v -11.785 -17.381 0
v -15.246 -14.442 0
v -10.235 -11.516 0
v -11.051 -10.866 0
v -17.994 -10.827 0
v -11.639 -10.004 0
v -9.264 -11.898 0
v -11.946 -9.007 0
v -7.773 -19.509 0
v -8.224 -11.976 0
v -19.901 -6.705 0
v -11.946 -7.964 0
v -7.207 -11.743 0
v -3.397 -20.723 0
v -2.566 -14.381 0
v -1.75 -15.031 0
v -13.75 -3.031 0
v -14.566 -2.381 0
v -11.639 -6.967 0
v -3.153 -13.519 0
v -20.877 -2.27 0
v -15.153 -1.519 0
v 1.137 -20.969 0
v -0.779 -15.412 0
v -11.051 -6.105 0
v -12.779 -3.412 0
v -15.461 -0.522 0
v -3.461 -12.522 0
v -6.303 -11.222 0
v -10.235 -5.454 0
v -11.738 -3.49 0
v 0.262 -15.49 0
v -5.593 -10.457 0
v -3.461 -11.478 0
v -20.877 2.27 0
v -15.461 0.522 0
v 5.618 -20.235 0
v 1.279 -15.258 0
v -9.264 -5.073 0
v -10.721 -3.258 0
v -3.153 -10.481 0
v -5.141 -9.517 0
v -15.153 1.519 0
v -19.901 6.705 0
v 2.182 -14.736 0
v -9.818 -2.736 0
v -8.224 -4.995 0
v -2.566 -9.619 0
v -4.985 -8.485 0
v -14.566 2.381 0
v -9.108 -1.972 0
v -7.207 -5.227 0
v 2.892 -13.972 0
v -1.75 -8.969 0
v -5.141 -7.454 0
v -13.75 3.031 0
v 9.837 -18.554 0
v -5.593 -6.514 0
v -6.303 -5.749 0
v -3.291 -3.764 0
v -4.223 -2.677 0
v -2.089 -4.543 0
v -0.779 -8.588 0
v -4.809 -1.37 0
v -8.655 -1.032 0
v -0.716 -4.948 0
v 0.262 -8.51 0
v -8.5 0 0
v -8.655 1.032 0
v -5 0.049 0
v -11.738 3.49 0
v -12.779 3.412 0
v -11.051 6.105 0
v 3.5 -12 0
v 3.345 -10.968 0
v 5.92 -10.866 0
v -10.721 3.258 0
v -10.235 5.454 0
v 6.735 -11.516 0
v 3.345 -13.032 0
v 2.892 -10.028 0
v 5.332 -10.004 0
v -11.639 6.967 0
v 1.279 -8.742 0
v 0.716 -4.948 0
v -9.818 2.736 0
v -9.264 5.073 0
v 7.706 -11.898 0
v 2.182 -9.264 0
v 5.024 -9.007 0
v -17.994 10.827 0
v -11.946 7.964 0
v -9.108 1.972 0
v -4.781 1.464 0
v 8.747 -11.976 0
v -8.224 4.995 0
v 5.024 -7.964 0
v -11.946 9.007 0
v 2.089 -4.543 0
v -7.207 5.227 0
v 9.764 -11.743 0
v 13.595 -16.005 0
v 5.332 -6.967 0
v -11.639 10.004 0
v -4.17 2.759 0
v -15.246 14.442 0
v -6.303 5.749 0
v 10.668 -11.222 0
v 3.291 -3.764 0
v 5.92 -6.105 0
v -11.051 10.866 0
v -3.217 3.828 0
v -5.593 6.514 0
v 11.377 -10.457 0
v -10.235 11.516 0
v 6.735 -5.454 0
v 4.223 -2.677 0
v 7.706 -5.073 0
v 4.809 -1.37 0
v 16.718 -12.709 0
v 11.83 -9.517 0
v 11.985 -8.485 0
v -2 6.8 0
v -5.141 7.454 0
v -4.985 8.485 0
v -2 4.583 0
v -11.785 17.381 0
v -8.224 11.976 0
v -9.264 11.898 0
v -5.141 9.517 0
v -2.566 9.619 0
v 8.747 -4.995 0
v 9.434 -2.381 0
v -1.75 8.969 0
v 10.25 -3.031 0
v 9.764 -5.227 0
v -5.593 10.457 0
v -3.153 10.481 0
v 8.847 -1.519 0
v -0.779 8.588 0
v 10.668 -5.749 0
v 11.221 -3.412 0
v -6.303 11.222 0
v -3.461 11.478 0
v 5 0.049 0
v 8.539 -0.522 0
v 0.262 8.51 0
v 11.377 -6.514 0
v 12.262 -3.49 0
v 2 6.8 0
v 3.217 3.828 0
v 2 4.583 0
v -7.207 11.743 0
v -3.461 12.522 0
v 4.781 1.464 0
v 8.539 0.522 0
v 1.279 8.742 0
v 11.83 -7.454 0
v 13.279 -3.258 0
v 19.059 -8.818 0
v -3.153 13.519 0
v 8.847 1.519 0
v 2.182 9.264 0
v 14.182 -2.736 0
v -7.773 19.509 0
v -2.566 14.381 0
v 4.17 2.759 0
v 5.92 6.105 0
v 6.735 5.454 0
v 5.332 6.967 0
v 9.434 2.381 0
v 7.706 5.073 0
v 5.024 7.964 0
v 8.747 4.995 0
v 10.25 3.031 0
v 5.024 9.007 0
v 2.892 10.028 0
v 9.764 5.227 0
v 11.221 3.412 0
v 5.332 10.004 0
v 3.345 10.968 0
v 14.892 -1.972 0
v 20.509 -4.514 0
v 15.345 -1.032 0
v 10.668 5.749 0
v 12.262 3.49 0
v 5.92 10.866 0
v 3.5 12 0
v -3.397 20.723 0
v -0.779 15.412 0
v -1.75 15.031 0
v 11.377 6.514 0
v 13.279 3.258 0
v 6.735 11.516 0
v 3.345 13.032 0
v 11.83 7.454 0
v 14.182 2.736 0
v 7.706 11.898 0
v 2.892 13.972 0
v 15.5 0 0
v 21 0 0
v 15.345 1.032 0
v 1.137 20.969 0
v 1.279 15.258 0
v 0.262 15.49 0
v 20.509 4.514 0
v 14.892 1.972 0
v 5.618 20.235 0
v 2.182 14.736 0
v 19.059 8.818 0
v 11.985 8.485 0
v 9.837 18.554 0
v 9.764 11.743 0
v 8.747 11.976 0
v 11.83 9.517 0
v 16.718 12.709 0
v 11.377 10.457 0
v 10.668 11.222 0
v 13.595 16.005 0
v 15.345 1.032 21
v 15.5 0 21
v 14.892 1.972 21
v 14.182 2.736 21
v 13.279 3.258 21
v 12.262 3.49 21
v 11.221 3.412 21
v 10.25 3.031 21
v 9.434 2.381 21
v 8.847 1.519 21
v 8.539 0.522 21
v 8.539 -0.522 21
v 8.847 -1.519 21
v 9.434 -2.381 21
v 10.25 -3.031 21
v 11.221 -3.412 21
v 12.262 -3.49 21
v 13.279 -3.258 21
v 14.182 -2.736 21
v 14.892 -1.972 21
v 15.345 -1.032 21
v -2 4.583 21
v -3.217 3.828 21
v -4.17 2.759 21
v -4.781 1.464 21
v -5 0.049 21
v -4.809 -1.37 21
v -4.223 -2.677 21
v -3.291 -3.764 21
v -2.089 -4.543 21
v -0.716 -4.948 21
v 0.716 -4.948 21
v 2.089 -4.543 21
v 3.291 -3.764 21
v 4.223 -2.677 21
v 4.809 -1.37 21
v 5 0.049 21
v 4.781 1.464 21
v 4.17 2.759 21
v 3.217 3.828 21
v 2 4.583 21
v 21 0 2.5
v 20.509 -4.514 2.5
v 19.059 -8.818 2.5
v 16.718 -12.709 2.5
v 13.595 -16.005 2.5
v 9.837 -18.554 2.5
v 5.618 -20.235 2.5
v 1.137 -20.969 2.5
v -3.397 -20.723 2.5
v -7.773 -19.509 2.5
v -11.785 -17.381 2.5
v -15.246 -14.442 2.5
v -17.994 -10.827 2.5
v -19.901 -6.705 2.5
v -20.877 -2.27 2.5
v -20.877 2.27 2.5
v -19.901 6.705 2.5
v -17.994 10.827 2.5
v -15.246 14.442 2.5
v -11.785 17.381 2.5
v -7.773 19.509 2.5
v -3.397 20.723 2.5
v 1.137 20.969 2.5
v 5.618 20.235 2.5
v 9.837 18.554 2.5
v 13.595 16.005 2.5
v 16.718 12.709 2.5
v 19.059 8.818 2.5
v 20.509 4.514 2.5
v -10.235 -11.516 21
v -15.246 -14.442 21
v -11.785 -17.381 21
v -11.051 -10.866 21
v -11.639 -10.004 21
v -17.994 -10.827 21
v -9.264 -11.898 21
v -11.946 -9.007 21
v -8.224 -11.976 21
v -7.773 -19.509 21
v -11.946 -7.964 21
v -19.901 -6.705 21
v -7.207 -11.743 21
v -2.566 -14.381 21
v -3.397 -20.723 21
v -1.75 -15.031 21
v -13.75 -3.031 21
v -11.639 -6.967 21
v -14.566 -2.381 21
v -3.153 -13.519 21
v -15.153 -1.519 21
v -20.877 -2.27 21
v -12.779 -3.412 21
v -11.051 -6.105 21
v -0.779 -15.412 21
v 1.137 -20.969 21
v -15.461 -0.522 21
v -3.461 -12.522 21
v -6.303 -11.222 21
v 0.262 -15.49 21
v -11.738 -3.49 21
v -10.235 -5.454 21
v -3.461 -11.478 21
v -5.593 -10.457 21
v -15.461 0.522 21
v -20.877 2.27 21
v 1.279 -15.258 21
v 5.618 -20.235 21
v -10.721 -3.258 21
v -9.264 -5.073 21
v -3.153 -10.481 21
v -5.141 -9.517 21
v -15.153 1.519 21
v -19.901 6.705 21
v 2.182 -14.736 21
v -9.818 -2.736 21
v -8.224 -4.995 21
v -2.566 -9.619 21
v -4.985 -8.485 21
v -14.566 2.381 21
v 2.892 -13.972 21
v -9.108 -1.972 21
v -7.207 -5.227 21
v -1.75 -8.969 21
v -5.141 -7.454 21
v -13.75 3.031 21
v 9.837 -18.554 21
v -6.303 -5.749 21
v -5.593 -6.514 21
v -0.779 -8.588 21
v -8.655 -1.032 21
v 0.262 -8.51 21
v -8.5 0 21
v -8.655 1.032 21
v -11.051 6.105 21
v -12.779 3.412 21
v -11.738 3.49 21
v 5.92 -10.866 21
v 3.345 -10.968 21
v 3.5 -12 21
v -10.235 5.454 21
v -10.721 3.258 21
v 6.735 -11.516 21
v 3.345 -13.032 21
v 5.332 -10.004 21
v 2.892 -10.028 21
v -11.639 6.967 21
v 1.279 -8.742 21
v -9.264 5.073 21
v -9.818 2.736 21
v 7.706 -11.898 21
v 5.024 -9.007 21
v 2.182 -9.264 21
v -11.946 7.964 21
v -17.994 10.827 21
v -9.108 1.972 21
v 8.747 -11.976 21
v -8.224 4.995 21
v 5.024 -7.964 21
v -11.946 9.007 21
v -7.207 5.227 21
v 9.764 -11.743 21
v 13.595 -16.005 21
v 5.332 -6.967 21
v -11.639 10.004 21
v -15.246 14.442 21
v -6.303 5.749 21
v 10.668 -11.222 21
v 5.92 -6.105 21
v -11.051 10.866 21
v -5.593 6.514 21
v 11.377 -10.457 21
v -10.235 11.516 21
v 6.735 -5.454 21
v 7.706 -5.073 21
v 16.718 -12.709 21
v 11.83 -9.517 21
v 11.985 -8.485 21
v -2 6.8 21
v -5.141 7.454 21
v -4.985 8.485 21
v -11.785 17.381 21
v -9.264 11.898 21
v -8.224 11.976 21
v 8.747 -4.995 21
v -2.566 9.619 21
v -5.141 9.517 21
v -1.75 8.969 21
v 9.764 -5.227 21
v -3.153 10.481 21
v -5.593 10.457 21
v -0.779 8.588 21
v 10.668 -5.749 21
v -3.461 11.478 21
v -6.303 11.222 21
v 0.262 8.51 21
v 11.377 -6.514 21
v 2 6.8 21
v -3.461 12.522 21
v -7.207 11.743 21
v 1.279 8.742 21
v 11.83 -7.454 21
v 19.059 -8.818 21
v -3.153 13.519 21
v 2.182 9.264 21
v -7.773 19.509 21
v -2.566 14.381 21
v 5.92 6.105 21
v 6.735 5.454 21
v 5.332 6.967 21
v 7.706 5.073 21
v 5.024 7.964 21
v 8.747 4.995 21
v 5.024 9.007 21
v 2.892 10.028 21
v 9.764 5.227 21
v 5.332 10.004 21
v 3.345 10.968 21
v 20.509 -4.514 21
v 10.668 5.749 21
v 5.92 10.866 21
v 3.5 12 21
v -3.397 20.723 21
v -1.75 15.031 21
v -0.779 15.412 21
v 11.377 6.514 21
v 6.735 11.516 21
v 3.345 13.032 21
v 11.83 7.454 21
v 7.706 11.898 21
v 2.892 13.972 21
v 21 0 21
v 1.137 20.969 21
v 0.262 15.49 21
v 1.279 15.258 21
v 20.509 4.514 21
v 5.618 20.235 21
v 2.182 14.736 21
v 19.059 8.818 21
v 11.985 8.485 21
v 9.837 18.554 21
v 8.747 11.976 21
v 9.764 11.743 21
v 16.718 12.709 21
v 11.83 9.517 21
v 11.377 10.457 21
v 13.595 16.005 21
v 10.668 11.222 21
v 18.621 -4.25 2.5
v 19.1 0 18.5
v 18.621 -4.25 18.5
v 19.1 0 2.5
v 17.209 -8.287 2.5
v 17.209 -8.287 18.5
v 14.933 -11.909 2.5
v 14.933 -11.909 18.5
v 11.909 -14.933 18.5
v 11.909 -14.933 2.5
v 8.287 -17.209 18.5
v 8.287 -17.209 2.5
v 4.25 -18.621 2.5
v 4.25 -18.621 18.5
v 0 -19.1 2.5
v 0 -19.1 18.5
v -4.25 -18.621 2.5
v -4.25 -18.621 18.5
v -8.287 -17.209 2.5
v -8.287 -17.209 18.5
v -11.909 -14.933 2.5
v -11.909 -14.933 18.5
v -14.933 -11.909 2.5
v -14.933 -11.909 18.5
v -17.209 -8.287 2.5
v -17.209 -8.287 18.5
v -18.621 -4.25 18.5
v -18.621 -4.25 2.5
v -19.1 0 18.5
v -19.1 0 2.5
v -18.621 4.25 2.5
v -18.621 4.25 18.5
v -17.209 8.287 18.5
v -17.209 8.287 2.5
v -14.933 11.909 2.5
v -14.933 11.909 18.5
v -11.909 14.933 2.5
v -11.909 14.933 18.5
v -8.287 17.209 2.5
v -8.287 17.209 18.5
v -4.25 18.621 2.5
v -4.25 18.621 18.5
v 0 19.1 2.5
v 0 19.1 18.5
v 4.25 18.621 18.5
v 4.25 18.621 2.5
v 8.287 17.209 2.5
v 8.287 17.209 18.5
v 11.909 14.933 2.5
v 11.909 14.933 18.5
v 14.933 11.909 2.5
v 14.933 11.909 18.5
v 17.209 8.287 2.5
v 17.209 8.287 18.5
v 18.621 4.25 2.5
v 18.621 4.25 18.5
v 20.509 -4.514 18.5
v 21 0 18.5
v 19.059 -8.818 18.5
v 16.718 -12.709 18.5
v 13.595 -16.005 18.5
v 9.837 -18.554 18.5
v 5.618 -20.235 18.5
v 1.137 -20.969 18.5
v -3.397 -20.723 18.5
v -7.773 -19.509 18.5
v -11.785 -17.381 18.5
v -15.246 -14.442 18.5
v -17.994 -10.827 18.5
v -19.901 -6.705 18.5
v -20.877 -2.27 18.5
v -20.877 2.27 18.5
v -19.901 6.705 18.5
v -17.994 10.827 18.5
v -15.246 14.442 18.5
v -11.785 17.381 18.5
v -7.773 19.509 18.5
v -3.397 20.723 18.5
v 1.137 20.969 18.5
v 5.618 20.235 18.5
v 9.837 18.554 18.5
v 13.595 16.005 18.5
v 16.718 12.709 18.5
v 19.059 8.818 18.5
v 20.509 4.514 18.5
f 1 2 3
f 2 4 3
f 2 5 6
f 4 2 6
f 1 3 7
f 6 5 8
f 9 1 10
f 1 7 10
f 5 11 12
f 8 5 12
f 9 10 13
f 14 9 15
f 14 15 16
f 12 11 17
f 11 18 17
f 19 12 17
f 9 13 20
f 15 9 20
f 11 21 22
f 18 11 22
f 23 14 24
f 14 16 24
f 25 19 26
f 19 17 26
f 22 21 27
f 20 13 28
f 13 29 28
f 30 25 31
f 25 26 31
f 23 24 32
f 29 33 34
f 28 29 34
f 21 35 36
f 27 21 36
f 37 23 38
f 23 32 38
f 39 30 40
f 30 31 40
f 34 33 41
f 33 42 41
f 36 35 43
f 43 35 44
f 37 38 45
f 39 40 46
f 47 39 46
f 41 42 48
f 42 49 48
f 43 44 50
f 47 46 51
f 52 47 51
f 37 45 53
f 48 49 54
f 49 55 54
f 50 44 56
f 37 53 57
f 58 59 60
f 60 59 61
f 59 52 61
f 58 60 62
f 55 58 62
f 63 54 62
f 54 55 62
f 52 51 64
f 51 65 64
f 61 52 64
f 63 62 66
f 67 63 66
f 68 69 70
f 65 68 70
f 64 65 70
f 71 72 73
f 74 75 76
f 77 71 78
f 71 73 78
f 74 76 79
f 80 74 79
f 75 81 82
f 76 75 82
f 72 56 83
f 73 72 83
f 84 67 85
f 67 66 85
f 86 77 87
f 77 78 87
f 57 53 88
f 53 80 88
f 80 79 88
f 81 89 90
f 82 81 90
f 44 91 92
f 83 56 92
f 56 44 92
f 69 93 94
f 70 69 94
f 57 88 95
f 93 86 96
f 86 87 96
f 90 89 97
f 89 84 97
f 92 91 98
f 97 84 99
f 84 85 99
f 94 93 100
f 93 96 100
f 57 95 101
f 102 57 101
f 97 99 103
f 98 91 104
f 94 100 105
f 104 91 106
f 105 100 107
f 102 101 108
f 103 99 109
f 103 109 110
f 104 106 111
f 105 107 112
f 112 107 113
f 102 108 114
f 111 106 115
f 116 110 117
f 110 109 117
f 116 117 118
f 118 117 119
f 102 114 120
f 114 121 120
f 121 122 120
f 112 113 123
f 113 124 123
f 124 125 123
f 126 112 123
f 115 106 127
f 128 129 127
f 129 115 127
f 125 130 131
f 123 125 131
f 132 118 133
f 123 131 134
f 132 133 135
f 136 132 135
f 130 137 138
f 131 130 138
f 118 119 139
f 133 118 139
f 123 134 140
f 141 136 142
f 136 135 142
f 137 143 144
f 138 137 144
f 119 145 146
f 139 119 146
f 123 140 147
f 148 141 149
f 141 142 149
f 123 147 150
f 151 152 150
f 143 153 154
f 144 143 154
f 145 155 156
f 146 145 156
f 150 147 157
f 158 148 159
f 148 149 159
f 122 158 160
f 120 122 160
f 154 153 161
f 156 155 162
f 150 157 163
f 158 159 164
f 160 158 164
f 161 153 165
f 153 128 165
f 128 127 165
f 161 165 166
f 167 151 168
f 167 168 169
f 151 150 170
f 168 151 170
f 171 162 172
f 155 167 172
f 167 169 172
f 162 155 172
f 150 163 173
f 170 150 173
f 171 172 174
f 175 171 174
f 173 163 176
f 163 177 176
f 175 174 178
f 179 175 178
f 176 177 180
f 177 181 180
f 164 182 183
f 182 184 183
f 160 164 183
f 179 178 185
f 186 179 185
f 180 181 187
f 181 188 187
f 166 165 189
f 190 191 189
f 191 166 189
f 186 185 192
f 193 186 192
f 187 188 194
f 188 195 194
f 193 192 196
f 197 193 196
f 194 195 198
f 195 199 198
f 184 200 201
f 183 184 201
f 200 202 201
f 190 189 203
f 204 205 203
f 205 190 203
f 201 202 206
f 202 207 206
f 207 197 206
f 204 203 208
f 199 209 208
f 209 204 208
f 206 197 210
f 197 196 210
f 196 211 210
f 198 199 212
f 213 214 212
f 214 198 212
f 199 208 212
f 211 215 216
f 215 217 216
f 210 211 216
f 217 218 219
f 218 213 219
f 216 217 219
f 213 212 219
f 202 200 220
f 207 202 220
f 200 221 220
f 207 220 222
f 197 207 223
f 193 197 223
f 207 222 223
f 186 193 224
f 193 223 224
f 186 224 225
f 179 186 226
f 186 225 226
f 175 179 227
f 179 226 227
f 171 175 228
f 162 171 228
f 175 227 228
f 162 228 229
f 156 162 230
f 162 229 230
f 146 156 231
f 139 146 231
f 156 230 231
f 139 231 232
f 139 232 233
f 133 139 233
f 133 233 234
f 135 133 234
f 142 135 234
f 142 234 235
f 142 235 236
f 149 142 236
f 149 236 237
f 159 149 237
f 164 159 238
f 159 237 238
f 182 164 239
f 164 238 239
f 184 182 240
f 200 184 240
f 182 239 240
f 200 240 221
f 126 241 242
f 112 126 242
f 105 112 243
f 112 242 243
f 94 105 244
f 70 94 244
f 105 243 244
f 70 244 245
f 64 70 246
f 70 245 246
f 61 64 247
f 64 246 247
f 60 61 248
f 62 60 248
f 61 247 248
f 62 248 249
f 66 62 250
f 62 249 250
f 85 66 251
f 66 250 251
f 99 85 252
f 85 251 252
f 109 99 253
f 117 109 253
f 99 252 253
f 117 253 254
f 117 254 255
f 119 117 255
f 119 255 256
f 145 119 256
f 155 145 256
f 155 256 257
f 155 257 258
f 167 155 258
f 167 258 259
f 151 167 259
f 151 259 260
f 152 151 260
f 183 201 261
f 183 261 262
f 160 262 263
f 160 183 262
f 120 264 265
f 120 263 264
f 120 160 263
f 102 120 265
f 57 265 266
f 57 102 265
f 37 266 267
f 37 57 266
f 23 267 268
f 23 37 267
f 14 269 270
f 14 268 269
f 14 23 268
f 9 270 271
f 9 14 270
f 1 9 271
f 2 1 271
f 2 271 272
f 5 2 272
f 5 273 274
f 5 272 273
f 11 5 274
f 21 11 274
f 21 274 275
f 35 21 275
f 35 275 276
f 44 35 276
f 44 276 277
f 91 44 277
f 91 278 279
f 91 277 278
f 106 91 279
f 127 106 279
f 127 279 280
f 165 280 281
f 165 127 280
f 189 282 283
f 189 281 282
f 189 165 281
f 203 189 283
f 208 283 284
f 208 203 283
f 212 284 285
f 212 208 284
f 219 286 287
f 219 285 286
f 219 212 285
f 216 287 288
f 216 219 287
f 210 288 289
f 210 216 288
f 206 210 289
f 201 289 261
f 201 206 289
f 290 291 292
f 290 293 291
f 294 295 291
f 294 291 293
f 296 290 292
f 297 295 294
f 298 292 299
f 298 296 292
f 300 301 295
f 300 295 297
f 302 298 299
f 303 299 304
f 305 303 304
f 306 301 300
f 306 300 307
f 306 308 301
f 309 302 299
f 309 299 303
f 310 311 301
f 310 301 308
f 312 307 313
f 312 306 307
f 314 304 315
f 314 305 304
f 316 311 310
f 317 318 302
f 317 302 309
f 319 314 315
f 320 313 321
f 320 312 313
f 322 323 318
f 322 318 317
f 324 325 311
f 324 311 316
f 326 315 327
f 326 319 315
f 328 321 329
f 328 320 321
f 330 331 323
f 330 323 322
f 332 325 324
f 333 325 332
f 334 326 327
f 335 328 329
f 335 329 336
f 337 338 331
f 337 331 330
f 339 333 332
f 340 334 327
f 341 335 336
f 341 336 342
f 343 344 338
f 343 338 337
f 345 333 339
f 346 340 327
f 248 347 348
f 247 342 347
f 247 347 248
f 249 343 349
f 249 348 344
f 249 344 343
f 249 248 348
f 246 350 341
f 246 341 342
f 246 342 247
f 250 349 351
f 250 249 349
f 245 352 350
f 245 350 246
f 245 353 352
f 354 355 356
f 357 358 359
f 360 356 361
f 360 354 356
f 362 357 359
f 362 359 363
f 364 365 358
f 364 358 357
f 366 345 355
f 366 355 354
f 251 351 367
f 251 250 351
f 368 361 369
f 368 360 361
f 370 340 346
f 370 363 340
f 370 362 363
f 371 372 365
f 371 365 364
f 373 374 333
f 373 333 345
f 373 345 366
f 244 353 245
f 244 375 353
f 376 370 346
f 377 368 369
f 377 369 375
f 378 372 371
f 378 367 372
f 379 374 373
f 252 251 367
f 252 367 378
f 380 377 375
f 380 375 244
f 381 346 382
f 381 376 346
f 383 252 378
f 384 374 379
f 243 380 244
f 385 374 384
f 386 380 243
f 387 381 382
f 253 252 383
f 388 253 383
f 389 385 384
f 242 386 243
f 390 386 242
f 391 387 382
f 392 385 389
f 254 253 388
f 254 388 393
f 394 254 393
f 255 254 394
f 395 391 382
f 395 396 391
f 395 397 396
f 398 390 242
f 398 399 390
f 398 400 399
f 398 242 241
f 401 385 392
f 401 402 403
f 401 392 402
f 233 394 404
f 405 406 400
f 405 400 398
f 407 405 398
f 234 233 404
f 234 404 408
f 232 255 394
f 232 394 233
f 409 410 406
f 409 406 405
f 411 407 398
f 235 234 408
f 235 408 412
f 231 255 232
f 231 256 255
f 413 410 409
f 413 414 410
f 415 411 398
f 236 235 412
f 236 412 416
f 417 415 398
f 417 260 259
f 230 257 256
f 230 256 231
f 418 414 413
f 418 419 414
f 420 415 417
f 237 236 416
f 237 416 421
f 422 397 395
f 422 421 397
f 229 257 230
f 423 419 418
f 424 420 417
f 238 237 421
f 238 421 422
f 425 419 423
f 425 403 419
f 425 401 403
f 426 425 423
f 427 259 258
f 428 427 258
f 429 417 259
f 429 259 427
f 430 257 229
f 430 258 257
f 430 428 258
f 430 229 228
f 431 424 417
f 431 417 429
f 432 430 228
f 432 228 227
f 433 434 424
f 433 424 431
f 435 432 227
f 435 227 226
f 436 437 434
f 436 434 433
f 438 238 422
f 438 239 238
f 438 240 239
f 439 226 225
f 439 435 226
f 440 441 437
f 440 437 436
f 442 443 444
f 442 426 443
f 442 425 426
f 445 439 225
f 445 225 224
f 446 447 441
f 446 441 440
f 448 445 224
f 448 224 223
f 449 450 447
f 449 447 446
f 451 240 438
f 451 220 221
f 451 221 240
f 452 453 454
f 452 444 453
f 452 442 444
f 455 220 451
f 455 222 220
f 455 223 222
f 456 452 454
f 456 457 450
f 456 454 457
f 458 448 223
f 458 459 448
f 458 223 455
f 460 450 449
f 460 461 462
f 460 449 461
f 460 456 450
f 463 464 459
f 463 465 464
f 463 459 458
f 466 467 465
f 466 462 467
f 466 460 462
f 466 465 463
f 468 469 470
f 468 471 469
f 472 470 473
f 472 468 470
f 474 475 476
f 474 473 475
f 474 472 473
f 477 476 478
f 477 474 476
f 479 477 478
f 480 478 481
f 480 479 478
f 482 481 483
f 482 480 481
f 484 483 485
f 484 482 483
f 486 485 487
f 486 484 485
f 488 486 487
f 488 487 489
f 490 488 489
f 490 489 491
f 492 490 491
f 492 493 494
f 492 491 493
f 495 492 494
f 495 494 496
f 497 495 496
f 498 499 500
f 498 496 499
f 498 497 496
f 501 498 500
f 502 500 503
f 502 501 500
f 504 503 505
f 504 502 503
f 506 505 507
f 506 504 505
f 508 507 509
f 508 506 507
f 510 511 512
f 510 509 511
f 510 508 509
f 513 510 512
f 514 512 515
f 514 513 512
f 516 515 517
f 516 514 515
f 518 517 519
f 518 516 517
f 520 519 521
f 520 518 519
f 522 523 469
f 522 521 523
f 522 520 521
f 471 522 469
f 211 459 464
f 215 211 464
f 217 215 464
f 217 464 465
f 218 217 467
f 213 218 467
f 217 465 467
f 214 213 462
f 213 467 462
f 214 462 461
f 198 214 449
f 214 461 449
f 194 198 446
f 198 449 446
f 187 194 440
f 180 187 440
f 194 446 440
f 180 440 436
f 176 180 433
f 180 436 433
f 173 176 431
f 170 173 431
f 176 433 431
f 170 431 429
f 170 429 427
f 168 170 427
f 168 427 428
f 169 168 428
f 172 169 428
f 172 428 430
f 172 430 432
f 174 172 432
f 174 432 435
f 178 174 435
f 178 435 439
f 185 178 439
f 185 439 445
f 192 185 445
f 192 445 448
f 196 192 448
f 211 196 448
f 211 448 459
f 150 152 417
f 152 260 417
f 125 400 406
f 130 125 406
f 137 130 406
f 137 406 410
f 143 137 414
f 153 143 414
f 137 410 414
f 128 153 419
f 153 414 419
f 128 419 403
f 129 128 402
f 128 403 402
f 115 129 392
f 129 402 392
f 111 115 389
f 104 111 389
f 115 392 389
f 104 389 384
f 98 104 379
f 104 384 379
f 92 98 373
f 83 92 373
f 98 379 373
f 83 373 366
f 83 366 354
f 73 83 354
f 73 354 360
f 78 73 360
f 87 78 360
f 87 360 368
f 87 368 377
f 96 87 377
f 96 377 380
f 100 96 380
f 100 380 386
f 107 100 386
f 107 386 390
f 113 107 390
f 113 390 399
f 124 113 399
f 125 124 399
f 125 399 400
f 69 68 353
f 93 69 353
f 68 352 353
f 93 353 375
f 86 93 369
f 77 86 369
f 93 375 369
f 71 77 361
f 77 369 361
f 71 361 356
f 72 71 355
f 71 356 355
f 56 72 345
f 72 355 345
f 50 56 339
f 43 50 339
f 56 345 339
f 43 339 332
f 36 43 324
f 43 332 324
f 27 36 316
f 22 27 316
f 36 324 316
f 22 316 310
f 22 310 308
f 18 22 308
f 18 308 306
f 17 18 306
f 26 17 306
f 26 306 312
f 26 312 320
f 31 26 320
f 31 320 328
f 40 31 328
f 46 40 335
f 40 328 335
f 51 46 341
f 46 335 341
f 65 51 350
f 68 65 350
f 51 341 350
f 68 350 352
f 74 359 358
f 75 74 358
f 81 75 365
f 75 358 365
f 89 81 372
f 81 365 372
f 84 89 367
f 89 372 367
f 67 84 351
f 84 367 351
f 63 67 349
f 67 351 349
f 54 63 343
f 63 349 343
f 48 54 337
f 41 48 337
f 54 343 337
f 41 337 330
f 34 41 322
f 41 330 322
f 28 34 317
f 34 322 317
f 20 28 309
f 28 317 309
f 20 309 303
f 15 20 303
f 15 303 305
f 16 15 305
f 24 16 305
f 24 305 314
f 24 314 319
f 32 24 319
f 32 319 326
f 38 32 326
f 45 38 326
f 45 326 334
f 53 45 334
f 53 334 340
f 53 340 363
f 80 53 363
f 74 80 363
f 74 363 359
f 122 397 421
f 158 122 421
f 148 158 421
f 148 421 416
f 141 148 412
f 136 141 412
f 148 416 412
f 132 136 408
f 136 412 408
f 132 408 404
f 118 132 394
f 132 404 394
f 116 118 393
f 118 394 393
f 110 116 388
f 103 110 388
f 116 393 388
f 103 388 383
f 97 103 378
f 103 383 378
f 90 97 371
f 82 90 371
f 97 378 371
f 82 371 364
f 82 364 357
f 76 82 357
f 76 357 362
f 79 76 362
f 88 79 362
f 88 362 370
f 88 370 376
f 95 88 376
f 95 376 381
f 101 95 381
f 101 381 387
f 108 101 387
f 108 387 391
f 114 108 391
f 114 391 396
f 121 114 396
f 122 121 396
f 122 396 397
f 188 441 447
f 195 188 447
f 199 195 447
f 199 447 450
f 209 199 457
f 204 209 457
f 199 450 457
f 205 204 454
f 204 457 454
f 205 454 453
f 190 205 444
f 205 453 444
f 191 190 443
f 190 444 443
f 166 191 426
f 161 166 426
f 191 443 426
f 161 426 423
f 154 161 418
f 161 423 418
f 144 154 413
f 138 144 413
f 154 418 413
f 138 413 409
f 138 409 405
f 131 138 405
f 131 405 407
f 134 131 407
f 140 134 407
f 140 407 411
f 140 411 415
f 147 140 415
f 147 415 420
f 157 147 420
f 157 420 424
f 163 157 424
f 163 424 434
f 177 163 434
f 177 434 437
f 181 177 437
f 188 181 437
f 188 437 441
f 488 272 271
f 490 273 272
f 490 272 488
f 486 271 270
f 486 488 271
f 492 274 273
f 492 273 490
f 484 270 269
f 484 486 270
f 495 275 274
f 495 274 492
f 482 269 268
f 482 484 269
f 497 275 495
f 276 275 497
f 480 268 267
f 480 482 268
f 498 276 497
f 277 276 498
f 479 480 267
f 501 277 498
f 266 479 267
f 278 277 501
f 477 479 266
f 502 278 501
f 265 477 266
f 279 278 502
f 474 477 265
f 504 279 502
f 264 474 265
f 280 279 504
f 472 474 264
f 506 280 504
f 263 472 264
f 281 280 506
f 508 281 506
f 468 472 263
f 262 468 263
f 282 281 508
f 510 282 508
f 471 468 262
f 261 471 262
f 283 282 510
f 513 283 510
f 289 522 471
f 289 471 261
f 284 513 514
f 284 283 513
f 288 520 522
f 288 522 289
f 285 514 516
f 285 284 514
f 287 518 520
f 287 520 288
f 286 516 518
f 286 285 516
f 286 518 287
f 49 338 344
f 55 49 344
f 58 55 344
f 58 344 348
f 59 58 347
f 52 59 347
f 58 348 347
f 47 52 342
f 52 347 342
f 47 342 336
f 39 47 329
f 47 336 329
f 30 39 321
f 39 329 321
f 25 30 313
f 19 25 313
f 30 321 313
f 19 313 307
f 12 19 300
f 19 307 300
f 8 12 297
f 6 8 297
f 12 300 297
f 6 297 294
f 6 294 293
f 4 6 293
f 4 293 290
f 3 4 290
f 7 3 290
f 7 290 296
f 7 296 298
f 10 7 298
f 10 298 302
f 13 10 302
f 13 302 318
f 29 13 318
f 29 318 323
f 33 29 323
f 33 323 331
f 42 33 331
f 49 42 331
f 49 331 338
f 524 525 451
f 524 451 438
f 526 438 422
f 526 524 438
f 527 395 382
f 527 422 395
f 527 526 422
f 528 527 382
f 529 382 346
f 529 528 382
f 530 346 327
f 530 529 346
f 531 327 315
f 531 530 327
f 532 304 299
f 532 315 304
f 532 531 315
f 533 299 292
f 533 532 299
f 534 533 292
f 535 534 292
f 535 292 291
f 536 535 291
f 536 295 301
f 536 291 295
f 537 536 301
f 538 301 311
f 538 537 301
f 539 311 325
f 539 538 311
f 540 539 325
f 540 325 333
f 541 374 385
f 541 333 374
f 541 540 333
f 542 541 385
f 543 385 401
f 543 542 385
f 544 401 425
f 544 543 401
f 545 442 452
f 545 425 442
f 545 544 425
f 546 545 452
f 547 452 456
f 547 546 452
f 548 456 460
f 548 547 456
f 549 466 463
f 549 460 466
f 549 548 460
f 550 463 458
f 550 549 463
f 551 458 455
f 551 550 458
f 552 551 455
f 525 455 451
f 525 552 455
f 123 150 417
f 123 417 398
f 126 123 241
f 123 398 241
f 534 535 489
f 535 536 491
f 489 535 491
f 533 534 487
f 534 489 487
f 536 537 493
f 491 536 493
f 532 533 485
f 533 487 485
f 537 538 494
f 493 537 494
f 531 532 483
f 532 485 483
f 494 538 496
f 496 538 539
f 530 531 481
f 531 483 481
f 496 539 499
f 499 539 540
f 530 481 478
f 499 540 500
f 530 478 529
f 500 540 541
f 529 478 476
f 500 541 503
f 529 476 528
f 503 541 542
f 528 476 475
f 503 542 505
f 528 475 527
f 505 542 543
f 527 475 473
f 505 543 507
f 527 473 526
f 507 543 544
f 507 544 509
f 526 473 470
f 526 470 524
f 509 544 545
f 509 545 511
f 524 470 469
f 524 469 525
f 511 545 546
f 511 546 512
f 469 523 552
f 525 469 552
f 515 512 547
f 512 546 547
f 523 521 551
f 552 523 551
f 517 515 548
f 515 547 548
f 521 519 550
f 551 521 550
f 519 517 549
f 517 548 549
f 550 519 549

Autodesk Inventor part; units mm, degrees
ref_plane "YZ Plane" through (0, 0, 0) normal (1, 0, 0) x (0, 1, 0)
ref_plane "XZ Plane" through (0, 0, 0) normal (0, 1, 0) x (-1, 0, 0)
ref_plane "XY Plane" through (0, 0, 0) normal (0, 0, 1) x (1, 0, 0)
sketch "Sketch1" plane through (0, 0, 0) normal (0, 0, 1) x (1, 0, 0)
  circle A0 centre (0, 0) radius 21
  dimension "d0" = 42
extrude "Extrusion1" add sketch "Sketch1" along normal blind 2.5
sketch "Sketch2" plane through (0, 0, 2.5) normal (0, 0, 1) x (1, 0, 0)
  circle A0 centre (0, 0) radius 19.1
  dimension "d3" = 38.2
extrude "Extrusion2" add sketch "Sketch2" along normal blind 16
sketch "Sketch3" plane through (0, 0, 18.5) normal (0, 0, 1) x (1, 0, 0)
  circle A0 centre (0, 0) radius 21
  dimension "d6" = 42
extrude "Extrusion3" add sketch "Sketch3" along normal blind 2.5
sketch "Sketch4" plane through (0, 0, 21) normal (0, 0, 1) x (1, 0, 0)
  circle A0 centre (0, 0) radius 5
  line L0 (-2, 3.2) -> (2, 3.2)
  line L1 (2, 3.2) -> (2, 6.8)
  line L2 (2, 6.8) -> (-2, 6.8)
  line L3 (-2, 6.8) -> (-2, 3.2)
  line L4 (-2, 3.2) -> (2, 6.8) construction
  line L5 (2, 3.2) -> (-2, 6.8) construction
  point P0 (0, 5)
  dimension "d9" = 10
  dimension "d10" = 4
  dimension "d11" = 3.6
extrude "Extrusion4" cut sketch "Sketch4" against normal blind 21
sketch "Sketch5" plane through (0, 0, 21) normal (0, 0, 1) x (1, 0, 0)
  circle A0 centre (0, -12) radius 3.5
  arc A1 (-2, 4.5826) -> (2, 4.5826) centre (0, 0) ccw projected
  line L0 (0, 0) -> (0, -12)
  line L1 (0, 0) -> (12, 0) construction
  circle A2 centre (8.4853, -8.4853) radius 3.5
  circle A3 centre (12, 0) radius 3.5
  circle A4 centre (8.4853, 8.4853) radius 3.5
  circle A5 centre (0, 12) radius 3.5
  circle A6 centre (-8.4853, 8.4853) radius 3.5
  circle A7 centre (-12, 0) radius 3.5
  circle A8 centre (-8.4853, -8.4853) radius 3.5
  dimension "d14" = 7
  dimension "d15" = 12
  dimension "d16" = 90
  dimension "d19" = 360
extrude "Extrusion5" cut sketch "Sketch5" against normal blind 21
properties part number "24 Teeth HTD5M Pulley Steel" material "Stainless Steel"
